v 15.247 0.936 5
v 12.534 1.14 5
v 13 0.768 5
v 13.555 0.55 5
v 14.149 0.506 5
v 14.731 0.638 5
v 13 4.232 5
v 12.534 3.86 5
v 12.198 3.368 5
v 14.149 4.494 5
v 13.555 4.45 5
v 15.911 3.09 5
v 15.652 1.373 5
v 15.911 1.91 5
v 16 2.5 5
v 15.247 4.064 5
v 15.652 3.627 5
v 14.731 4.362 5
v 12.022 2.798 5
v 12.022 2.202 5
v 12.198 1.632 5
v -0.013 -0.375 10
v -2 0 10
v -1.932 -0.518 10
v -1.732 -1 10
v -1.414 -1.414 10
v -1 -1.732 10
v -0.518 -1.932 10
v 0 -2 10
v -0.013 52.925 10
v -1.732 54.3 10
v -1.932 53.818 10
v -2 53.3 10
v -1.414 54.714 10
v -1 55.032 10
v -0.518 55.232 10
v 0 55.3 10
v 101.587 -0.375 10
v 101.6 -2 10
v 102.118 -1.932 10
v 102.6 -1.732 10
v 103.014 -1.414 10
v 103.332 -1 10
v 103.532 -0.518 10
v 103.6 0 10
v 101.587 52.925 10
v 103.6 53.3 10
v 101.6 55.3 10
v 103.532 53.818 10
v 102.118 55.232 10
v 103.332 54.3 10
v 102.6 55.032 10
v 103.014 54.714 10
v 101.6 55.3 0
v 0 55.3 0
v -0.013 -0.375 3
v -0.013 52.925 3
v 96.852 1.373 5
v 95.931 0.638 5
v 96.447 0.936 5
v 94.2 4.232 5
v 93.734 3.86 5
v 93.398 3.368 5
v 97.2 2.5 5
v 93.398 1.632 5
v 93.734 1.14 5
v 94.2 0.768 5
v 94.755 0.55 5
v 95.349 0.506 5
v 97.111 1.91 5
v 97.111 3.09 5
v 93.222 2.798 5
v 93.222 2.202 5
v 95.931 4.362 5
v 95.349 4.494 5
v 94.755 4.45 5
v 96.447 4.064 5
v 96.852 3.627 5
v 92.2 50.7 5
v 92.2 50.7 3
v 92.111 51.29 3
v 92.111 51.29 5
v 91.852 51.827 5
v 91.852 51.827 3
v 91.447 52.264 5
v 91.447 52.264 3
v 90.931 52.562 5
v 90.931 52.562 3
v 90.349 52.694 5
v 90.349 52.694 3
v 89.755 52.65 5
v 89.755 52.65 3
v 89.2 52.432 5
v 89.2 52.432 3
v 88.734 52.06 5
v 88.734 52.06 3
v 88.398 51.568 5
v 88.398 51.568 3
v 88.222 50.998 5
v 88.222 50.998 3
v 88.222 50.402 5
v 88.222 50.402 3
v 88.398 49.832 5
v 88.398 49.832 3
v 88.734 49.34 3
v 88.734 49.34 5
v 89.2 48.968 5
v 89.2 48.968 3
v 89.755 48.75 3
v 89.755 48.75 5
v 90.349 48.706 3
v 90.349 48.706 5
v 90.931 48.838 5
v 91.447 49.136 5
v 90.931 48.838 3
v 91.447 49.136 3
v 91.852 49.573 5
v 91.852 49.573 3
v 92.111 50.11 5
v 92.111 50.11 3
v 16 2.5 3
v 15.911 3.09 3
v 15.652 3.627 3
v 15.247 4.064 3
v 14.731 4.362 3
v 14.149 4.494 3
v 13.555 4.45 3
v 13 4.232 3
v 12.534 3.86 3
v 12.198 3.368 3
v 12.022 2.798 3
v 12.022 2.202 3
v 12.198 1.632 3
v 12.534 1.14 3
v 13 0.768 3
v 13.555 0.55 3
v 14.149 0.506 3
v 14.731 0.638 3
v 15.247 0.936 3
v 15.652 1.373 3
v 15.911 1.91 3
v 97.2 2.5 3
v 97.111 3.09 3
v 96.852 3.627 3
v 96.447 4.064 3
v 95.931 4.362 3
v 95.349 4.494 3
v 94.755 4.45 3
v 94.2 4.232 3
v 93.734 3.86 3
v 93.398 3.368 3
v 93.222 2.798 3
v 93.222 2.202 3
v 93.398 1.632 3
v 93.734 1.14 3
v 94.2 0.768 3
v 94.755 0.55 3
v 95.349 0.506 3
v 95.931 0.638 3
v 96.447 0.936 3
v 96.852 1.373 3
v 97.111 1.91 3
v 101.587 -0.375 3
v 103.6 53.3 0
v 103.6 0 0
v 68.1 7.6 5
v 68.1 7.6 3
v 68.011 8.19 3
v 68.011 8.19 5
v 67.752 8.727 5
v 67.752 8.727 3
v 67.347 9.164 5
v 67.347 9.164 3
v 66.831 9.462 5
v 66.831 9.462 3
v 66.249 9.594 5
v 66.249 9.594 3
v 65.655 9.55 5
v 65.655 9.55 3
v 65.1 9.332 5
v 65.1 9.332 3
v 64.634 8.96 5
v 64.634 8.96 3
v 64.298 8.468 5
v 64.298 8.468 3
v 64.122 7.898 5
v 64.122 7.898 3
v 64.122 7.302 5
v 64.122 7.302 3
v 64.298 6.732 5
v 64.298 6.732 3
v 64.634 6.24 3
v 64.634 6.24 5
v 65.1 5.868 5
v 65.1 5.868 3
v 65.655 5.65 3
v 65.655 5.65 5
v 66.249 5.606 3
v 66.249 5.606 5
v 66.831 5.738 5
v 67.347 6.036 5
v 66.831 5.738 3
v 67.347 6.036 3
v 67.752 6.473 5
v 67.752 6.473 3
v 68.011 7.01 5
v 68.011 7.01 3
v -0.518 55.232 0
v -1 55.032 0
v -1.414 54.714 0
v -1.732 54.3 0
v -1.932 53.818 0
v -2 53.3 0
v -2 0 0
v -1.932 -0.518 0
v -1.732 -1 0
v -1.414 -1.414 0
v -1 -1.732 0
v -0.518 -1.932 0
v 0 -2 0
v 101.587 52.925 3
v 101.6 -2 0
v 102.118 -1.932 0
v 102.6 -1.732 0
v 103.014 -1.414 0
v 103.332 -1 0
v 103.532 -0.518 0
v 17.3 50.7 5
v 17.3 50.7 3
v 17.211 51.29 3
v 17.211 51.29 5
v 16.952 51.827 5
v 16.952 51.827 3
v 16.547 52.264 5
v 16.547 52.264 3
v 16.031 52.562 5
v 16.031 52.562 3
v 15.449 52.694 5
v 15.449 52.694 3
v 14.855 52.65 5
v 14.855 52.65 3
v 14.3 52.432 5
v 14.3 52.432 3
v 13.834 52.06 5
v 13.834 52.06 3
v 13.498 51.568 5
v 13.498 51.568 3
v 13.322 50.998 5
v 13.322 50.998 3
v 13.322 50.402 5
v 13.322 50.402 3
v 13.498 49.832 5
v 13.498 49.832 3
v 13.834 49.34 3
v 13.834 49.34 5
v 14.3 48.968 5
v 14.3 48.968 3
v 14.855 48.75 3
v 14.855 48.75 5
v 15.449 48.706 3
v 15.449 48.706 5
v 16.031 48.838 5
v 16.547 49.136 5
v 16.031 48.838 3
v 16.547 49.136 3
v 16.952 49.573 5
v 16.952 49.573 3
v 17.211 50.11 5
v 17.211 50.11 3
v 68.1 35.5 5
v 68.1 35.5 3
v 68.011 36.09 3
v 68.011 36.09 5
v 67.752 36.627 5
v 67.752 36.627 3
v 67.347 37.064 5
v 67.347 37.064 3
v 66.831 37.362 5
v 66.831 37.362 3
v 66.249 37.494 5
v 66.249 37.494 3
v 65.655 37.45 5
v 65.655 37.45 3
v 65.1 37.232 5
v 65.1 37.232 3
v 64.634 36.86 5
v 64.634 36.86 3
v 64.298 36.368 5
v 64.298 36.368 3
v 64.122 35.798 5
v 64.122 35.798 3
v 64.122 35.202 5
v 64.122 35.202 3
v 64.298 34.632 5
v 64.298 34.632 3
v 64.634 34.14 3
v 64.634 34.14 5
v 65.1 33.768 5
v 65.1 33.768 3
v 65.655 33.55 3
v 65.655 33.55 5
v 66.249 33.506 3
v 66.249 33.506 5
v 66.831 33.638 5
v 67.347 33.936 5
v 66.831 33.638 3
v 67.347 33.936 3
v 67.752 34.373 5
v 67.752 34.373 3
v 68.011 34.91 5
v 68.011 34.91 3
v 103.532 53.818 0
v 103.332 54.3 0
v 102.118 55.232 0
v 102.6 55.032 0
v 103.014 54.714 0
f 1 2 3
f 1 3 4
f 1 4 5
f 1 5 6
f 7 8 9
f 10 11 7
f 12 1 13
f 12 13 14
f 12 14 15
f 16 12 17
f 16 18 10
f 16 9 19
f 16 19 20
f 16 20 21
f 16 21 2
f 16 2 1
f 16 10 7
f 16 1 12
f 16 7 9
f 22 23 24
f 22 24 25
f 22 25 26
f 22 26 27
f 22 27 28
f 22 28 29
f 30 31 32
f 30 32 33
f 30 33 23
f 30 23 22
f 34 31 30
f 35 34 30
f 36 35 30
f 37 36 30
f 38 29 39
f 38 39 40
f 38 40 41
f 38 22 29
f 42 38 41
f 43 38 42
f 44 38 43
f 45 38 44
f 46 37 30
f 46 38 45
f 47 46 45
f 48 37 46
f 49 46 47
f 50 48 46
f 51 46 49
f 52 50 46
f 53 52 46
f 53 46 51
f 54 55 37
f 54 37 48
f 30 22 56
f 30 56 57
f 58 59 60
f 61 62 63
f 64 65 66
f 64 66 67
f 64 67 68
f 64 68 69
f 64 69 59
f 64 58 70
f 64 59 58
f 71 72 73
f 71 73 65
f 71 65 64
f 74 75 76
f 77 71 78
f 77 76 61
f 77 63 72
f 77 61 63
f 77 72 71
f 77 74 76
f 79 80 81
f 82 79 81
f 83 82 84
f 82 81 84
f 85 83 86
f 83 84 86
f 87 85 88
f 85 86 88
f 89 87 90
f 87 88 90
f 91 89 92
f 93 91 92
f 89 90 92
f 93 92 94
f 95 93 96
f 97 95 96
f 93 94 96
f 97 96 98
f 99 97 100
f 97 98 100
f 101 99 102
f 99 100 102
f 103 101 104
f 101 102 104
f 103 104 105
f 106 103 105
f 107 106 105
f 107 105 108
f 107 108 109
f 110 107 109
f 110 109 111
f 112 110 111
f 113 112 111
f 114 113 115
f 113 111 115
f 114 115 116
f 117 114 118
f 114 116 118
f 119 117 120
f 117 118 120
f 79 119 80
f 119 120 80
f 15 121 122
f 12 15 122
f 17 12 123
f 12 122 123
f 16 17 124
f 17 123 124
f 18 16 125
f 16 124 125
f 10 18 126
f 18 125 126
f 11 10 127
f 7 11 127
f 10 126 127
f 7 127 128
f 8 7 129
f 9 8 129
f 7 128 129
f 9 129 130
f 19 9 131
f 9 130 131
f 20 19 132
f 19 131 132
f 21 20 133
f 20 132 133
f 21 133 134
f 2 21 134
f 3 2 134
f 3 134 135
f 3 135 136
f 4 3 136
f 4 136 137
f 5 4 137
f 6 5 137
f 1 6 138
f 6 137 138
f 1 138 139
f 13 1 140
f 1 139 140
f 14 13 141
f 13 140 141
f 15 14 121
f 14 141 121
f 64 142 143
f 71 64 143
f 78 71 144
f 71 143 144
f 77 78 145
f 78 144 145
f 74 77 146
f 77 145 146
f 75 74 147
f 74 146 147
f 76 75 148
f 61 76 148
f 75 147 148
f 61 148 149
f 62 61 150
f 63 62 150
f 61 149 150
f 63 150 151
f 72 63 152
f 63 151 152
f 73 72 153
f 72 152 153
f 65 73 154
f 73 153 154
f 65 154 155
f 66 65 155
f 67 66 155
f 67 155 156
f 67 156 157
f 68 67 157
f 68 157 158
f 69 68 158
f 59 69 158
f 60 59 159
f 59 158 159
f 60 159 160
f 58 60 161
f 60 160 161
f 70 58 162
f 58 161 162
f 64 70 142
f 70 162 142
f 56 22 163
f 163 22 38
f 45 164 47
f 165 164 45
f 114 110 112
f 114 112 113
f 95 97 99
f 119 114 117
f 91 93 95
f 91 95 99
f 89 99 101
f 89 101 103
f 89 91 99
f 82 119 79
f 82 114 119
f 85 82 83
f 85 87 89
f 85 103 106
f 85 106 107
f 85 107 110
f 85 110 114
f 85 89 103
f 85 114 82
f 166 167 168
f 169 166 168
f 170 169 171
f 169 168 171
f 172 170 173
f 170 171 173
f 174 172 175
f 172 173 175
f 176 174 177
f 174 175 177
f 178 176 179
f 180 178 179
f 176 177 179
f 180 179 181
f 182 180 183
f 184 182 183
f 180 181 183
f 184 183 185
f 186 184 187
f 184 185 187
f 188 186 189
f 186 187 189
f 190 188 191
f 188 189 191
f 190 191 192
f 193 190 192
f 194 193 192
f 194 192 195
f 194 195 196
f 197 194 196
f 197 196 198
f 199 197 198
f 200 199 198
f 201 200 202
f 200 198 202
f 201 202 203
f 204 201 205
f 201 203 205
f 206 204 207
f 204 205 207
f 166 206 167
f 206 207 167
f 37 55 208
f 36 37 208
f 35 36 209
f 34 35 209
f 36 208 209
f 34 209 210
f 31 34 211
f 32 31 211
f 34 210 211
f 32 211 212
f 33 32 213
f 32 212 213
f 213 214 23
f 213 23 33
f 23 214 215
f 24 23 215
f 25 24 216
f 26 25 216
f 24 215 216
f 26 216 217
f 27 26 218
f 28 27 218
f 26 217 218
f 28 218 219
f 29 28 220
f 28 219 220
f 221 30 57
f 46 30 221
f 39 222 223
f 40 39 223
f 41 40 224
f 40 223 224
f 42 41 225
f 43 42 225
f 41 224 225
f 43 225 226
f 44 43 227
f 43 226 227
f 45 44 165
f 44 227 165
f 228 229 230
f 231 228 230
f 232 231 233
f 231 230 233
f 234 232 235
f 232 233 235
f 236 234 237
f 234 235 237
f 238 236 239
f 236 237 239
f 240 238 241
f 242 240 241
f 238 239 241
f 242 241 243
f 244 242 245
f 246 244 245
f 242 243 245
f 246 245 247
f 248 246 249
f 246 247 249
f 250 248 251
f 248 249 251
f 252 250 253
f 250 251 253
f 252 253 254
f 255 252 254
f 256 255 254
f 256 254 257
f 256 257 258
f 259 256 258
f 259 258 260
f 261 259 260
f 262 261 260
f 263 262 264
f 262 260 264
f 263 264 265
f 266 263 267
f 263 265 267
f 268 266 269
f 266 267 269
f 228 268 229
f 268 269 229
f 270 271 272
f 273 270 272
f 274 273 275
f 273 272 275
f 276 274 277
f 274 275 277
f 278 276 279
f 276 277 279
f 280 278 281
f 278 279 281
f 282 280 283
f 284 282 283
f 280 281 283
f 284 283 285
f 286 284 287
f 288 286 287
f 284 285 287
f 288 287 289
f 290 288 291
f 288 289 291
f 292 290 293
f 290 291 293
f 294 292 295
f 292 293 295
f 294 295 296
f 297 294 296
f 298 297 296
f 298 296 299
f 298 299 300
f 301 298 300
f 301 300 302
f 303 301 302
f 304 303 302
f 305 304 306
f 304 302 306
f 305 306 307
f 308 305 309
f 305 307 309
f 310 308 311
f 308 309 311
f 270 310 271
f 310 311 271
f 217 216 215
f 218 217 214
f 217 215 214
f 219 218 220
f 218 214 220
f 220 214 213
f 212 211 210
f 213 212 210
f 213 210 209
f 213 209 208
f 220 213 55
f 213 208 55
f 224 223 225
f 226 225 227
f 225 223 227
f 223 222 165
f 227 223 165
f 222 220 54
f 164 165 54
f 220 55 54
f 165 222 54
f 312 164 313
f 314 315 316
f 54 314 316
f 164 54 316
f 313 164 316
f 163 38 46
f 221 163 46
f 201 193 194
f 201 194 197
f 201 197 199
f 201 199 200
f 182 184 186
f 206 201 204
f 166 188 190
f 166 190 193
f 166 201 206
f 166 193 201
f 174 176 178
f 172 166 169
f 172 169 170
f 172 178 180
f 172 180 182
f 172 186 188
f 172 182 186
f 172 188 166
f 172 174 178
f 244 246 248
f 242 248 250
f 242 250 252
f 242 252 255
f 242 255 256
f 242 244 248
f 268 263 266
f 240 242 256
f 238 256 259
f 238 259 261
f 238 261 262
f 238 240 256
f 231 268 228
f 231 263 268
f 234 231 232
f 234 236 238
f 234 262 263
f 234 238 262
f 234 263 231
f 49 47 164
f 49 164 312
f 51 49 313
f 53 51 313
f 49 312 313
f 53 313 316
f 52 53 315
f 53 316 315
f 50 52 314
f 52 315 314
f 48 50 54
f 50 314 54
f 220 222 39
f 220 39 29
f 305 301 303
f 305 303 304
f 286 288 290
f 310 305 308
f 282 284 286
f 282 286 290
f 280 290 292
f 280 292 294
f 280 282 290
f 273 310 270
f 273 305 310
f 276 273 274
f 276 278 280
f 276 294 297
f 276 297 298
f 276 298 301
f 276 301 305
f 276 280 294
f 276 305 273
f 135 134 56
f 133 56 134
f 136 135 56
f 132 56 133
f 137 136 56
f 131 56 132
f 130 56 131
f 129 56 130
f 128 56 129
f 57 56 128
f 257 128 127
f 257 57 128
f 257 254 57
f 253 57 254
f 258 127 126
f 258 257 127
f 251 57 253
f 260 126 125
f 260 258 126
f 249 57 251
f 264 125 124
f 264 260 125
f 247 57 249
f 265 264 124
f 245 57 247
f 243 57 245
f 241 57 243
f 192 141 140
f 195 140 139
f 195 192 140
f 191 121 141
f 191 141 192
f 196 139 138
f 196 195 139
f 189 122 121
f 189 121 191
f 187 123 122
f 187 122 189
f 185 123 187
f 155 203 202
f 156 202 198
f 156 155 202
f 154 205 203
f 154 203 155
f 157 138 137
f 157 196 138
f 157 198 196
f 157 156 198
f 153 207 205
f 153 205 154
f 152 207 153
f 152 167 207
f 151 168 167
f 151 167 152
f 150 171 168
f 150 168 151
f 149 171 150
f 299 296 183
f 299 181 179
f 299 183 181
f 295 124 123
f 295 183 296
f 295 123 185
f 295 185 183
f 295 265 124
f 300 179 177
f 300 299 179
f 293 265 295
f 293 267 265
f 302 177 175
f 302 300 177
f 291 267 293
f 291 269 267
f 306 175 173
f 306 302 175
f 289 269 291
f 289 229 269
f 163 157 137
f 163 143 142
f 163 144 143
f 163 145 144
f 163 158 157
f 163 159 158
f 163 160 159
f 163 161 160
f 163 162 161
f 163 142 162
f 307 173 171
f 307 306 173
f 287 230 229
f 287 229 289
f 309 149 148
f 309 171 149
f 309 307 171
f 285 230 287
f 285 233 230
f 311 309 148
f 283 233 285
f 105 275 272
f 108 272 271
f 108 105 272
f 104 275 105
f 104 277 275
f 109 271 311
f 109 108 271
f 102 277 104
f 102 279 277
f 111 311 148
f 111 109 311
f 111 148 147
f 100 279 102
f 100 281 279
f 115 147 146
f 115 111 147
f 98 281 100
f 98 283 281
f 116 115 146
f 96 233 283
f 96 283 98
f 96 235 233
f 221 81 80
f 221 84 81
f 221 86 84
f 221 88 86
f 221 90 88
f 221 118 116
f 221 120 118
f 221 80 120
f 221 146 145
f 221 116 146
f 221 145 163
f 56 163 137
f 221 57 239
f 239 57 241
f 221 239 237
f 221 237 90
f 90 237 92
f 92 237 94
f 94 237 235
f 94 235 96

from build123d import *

# Parameters (mm, degrees)
PAD_DEPTH    = 10
SKETCH001_W  = 101.6
SKETCH001_H  = 53.3
POCKET_DEPTH = 7
SKETCH002_R  = 2
PAD001_DEPTH = 2


with BuildPart() as part:
    # Sketch → Pad (new body)
    with BuildSketch(Plane.XY):
        with BuildLine():
            ThreePointArc((0, 55.3), (-1.414219, 54.714208), (-2, 53.299986))
            Line((-2, 0), (-2, 53.299986))
            ThreePointArc((-2, 0), (-1.414214, -1.414214), (0, -2))
            Line((101.6, -2), (0, -2))
            ThreePointArc((101.6, -2), (103.014214, -1.414214), (103.6, 0))
            Line((103.6, 53.3), (103.6, 0))
            ThreePointArc((103.6, 53.3), (103.014214, 54.714214), (101.6, 55.3))
            Line((0, 55.3), (101.6, 55.3))
        make_face()
    extrude(amount=PAD_DEPTH)

    # Sketch001 → Pocket (cut)
    with BuildSketch(Plane.XY.offset(10)):
        with Locations((50.786842, 26.274506)):
            Rectangle(SKETCH001_W, SKETCH001_H)
    extrude(amount=-POCKET_DEPTH, mode=Mode.SUBTRACT)

    # Sketch002 → Pad001 (new body)
    with BuildSketch(Plane.XY.offset(3)):
        with Locations((15.3, 50.7)):
            Circle(SKETCH002_R)
        with Locations((14, 2.5)):
            Circle(SKETCH002_R)
        with Locations((66.1, 35.5)):
            Circle(SKETCH002_R)
        with Locations((66.1, 7.6)):
            Circle(SKETCH002_R)
        with Locations((90.2, 50.7)):
            Circle(SKETCH002_R)
        with Locations((95.2, 2.5)):
            Circle(SKETCH002_R)
    extrude(amount=PAD001_DEPTH)


solid = part.part
